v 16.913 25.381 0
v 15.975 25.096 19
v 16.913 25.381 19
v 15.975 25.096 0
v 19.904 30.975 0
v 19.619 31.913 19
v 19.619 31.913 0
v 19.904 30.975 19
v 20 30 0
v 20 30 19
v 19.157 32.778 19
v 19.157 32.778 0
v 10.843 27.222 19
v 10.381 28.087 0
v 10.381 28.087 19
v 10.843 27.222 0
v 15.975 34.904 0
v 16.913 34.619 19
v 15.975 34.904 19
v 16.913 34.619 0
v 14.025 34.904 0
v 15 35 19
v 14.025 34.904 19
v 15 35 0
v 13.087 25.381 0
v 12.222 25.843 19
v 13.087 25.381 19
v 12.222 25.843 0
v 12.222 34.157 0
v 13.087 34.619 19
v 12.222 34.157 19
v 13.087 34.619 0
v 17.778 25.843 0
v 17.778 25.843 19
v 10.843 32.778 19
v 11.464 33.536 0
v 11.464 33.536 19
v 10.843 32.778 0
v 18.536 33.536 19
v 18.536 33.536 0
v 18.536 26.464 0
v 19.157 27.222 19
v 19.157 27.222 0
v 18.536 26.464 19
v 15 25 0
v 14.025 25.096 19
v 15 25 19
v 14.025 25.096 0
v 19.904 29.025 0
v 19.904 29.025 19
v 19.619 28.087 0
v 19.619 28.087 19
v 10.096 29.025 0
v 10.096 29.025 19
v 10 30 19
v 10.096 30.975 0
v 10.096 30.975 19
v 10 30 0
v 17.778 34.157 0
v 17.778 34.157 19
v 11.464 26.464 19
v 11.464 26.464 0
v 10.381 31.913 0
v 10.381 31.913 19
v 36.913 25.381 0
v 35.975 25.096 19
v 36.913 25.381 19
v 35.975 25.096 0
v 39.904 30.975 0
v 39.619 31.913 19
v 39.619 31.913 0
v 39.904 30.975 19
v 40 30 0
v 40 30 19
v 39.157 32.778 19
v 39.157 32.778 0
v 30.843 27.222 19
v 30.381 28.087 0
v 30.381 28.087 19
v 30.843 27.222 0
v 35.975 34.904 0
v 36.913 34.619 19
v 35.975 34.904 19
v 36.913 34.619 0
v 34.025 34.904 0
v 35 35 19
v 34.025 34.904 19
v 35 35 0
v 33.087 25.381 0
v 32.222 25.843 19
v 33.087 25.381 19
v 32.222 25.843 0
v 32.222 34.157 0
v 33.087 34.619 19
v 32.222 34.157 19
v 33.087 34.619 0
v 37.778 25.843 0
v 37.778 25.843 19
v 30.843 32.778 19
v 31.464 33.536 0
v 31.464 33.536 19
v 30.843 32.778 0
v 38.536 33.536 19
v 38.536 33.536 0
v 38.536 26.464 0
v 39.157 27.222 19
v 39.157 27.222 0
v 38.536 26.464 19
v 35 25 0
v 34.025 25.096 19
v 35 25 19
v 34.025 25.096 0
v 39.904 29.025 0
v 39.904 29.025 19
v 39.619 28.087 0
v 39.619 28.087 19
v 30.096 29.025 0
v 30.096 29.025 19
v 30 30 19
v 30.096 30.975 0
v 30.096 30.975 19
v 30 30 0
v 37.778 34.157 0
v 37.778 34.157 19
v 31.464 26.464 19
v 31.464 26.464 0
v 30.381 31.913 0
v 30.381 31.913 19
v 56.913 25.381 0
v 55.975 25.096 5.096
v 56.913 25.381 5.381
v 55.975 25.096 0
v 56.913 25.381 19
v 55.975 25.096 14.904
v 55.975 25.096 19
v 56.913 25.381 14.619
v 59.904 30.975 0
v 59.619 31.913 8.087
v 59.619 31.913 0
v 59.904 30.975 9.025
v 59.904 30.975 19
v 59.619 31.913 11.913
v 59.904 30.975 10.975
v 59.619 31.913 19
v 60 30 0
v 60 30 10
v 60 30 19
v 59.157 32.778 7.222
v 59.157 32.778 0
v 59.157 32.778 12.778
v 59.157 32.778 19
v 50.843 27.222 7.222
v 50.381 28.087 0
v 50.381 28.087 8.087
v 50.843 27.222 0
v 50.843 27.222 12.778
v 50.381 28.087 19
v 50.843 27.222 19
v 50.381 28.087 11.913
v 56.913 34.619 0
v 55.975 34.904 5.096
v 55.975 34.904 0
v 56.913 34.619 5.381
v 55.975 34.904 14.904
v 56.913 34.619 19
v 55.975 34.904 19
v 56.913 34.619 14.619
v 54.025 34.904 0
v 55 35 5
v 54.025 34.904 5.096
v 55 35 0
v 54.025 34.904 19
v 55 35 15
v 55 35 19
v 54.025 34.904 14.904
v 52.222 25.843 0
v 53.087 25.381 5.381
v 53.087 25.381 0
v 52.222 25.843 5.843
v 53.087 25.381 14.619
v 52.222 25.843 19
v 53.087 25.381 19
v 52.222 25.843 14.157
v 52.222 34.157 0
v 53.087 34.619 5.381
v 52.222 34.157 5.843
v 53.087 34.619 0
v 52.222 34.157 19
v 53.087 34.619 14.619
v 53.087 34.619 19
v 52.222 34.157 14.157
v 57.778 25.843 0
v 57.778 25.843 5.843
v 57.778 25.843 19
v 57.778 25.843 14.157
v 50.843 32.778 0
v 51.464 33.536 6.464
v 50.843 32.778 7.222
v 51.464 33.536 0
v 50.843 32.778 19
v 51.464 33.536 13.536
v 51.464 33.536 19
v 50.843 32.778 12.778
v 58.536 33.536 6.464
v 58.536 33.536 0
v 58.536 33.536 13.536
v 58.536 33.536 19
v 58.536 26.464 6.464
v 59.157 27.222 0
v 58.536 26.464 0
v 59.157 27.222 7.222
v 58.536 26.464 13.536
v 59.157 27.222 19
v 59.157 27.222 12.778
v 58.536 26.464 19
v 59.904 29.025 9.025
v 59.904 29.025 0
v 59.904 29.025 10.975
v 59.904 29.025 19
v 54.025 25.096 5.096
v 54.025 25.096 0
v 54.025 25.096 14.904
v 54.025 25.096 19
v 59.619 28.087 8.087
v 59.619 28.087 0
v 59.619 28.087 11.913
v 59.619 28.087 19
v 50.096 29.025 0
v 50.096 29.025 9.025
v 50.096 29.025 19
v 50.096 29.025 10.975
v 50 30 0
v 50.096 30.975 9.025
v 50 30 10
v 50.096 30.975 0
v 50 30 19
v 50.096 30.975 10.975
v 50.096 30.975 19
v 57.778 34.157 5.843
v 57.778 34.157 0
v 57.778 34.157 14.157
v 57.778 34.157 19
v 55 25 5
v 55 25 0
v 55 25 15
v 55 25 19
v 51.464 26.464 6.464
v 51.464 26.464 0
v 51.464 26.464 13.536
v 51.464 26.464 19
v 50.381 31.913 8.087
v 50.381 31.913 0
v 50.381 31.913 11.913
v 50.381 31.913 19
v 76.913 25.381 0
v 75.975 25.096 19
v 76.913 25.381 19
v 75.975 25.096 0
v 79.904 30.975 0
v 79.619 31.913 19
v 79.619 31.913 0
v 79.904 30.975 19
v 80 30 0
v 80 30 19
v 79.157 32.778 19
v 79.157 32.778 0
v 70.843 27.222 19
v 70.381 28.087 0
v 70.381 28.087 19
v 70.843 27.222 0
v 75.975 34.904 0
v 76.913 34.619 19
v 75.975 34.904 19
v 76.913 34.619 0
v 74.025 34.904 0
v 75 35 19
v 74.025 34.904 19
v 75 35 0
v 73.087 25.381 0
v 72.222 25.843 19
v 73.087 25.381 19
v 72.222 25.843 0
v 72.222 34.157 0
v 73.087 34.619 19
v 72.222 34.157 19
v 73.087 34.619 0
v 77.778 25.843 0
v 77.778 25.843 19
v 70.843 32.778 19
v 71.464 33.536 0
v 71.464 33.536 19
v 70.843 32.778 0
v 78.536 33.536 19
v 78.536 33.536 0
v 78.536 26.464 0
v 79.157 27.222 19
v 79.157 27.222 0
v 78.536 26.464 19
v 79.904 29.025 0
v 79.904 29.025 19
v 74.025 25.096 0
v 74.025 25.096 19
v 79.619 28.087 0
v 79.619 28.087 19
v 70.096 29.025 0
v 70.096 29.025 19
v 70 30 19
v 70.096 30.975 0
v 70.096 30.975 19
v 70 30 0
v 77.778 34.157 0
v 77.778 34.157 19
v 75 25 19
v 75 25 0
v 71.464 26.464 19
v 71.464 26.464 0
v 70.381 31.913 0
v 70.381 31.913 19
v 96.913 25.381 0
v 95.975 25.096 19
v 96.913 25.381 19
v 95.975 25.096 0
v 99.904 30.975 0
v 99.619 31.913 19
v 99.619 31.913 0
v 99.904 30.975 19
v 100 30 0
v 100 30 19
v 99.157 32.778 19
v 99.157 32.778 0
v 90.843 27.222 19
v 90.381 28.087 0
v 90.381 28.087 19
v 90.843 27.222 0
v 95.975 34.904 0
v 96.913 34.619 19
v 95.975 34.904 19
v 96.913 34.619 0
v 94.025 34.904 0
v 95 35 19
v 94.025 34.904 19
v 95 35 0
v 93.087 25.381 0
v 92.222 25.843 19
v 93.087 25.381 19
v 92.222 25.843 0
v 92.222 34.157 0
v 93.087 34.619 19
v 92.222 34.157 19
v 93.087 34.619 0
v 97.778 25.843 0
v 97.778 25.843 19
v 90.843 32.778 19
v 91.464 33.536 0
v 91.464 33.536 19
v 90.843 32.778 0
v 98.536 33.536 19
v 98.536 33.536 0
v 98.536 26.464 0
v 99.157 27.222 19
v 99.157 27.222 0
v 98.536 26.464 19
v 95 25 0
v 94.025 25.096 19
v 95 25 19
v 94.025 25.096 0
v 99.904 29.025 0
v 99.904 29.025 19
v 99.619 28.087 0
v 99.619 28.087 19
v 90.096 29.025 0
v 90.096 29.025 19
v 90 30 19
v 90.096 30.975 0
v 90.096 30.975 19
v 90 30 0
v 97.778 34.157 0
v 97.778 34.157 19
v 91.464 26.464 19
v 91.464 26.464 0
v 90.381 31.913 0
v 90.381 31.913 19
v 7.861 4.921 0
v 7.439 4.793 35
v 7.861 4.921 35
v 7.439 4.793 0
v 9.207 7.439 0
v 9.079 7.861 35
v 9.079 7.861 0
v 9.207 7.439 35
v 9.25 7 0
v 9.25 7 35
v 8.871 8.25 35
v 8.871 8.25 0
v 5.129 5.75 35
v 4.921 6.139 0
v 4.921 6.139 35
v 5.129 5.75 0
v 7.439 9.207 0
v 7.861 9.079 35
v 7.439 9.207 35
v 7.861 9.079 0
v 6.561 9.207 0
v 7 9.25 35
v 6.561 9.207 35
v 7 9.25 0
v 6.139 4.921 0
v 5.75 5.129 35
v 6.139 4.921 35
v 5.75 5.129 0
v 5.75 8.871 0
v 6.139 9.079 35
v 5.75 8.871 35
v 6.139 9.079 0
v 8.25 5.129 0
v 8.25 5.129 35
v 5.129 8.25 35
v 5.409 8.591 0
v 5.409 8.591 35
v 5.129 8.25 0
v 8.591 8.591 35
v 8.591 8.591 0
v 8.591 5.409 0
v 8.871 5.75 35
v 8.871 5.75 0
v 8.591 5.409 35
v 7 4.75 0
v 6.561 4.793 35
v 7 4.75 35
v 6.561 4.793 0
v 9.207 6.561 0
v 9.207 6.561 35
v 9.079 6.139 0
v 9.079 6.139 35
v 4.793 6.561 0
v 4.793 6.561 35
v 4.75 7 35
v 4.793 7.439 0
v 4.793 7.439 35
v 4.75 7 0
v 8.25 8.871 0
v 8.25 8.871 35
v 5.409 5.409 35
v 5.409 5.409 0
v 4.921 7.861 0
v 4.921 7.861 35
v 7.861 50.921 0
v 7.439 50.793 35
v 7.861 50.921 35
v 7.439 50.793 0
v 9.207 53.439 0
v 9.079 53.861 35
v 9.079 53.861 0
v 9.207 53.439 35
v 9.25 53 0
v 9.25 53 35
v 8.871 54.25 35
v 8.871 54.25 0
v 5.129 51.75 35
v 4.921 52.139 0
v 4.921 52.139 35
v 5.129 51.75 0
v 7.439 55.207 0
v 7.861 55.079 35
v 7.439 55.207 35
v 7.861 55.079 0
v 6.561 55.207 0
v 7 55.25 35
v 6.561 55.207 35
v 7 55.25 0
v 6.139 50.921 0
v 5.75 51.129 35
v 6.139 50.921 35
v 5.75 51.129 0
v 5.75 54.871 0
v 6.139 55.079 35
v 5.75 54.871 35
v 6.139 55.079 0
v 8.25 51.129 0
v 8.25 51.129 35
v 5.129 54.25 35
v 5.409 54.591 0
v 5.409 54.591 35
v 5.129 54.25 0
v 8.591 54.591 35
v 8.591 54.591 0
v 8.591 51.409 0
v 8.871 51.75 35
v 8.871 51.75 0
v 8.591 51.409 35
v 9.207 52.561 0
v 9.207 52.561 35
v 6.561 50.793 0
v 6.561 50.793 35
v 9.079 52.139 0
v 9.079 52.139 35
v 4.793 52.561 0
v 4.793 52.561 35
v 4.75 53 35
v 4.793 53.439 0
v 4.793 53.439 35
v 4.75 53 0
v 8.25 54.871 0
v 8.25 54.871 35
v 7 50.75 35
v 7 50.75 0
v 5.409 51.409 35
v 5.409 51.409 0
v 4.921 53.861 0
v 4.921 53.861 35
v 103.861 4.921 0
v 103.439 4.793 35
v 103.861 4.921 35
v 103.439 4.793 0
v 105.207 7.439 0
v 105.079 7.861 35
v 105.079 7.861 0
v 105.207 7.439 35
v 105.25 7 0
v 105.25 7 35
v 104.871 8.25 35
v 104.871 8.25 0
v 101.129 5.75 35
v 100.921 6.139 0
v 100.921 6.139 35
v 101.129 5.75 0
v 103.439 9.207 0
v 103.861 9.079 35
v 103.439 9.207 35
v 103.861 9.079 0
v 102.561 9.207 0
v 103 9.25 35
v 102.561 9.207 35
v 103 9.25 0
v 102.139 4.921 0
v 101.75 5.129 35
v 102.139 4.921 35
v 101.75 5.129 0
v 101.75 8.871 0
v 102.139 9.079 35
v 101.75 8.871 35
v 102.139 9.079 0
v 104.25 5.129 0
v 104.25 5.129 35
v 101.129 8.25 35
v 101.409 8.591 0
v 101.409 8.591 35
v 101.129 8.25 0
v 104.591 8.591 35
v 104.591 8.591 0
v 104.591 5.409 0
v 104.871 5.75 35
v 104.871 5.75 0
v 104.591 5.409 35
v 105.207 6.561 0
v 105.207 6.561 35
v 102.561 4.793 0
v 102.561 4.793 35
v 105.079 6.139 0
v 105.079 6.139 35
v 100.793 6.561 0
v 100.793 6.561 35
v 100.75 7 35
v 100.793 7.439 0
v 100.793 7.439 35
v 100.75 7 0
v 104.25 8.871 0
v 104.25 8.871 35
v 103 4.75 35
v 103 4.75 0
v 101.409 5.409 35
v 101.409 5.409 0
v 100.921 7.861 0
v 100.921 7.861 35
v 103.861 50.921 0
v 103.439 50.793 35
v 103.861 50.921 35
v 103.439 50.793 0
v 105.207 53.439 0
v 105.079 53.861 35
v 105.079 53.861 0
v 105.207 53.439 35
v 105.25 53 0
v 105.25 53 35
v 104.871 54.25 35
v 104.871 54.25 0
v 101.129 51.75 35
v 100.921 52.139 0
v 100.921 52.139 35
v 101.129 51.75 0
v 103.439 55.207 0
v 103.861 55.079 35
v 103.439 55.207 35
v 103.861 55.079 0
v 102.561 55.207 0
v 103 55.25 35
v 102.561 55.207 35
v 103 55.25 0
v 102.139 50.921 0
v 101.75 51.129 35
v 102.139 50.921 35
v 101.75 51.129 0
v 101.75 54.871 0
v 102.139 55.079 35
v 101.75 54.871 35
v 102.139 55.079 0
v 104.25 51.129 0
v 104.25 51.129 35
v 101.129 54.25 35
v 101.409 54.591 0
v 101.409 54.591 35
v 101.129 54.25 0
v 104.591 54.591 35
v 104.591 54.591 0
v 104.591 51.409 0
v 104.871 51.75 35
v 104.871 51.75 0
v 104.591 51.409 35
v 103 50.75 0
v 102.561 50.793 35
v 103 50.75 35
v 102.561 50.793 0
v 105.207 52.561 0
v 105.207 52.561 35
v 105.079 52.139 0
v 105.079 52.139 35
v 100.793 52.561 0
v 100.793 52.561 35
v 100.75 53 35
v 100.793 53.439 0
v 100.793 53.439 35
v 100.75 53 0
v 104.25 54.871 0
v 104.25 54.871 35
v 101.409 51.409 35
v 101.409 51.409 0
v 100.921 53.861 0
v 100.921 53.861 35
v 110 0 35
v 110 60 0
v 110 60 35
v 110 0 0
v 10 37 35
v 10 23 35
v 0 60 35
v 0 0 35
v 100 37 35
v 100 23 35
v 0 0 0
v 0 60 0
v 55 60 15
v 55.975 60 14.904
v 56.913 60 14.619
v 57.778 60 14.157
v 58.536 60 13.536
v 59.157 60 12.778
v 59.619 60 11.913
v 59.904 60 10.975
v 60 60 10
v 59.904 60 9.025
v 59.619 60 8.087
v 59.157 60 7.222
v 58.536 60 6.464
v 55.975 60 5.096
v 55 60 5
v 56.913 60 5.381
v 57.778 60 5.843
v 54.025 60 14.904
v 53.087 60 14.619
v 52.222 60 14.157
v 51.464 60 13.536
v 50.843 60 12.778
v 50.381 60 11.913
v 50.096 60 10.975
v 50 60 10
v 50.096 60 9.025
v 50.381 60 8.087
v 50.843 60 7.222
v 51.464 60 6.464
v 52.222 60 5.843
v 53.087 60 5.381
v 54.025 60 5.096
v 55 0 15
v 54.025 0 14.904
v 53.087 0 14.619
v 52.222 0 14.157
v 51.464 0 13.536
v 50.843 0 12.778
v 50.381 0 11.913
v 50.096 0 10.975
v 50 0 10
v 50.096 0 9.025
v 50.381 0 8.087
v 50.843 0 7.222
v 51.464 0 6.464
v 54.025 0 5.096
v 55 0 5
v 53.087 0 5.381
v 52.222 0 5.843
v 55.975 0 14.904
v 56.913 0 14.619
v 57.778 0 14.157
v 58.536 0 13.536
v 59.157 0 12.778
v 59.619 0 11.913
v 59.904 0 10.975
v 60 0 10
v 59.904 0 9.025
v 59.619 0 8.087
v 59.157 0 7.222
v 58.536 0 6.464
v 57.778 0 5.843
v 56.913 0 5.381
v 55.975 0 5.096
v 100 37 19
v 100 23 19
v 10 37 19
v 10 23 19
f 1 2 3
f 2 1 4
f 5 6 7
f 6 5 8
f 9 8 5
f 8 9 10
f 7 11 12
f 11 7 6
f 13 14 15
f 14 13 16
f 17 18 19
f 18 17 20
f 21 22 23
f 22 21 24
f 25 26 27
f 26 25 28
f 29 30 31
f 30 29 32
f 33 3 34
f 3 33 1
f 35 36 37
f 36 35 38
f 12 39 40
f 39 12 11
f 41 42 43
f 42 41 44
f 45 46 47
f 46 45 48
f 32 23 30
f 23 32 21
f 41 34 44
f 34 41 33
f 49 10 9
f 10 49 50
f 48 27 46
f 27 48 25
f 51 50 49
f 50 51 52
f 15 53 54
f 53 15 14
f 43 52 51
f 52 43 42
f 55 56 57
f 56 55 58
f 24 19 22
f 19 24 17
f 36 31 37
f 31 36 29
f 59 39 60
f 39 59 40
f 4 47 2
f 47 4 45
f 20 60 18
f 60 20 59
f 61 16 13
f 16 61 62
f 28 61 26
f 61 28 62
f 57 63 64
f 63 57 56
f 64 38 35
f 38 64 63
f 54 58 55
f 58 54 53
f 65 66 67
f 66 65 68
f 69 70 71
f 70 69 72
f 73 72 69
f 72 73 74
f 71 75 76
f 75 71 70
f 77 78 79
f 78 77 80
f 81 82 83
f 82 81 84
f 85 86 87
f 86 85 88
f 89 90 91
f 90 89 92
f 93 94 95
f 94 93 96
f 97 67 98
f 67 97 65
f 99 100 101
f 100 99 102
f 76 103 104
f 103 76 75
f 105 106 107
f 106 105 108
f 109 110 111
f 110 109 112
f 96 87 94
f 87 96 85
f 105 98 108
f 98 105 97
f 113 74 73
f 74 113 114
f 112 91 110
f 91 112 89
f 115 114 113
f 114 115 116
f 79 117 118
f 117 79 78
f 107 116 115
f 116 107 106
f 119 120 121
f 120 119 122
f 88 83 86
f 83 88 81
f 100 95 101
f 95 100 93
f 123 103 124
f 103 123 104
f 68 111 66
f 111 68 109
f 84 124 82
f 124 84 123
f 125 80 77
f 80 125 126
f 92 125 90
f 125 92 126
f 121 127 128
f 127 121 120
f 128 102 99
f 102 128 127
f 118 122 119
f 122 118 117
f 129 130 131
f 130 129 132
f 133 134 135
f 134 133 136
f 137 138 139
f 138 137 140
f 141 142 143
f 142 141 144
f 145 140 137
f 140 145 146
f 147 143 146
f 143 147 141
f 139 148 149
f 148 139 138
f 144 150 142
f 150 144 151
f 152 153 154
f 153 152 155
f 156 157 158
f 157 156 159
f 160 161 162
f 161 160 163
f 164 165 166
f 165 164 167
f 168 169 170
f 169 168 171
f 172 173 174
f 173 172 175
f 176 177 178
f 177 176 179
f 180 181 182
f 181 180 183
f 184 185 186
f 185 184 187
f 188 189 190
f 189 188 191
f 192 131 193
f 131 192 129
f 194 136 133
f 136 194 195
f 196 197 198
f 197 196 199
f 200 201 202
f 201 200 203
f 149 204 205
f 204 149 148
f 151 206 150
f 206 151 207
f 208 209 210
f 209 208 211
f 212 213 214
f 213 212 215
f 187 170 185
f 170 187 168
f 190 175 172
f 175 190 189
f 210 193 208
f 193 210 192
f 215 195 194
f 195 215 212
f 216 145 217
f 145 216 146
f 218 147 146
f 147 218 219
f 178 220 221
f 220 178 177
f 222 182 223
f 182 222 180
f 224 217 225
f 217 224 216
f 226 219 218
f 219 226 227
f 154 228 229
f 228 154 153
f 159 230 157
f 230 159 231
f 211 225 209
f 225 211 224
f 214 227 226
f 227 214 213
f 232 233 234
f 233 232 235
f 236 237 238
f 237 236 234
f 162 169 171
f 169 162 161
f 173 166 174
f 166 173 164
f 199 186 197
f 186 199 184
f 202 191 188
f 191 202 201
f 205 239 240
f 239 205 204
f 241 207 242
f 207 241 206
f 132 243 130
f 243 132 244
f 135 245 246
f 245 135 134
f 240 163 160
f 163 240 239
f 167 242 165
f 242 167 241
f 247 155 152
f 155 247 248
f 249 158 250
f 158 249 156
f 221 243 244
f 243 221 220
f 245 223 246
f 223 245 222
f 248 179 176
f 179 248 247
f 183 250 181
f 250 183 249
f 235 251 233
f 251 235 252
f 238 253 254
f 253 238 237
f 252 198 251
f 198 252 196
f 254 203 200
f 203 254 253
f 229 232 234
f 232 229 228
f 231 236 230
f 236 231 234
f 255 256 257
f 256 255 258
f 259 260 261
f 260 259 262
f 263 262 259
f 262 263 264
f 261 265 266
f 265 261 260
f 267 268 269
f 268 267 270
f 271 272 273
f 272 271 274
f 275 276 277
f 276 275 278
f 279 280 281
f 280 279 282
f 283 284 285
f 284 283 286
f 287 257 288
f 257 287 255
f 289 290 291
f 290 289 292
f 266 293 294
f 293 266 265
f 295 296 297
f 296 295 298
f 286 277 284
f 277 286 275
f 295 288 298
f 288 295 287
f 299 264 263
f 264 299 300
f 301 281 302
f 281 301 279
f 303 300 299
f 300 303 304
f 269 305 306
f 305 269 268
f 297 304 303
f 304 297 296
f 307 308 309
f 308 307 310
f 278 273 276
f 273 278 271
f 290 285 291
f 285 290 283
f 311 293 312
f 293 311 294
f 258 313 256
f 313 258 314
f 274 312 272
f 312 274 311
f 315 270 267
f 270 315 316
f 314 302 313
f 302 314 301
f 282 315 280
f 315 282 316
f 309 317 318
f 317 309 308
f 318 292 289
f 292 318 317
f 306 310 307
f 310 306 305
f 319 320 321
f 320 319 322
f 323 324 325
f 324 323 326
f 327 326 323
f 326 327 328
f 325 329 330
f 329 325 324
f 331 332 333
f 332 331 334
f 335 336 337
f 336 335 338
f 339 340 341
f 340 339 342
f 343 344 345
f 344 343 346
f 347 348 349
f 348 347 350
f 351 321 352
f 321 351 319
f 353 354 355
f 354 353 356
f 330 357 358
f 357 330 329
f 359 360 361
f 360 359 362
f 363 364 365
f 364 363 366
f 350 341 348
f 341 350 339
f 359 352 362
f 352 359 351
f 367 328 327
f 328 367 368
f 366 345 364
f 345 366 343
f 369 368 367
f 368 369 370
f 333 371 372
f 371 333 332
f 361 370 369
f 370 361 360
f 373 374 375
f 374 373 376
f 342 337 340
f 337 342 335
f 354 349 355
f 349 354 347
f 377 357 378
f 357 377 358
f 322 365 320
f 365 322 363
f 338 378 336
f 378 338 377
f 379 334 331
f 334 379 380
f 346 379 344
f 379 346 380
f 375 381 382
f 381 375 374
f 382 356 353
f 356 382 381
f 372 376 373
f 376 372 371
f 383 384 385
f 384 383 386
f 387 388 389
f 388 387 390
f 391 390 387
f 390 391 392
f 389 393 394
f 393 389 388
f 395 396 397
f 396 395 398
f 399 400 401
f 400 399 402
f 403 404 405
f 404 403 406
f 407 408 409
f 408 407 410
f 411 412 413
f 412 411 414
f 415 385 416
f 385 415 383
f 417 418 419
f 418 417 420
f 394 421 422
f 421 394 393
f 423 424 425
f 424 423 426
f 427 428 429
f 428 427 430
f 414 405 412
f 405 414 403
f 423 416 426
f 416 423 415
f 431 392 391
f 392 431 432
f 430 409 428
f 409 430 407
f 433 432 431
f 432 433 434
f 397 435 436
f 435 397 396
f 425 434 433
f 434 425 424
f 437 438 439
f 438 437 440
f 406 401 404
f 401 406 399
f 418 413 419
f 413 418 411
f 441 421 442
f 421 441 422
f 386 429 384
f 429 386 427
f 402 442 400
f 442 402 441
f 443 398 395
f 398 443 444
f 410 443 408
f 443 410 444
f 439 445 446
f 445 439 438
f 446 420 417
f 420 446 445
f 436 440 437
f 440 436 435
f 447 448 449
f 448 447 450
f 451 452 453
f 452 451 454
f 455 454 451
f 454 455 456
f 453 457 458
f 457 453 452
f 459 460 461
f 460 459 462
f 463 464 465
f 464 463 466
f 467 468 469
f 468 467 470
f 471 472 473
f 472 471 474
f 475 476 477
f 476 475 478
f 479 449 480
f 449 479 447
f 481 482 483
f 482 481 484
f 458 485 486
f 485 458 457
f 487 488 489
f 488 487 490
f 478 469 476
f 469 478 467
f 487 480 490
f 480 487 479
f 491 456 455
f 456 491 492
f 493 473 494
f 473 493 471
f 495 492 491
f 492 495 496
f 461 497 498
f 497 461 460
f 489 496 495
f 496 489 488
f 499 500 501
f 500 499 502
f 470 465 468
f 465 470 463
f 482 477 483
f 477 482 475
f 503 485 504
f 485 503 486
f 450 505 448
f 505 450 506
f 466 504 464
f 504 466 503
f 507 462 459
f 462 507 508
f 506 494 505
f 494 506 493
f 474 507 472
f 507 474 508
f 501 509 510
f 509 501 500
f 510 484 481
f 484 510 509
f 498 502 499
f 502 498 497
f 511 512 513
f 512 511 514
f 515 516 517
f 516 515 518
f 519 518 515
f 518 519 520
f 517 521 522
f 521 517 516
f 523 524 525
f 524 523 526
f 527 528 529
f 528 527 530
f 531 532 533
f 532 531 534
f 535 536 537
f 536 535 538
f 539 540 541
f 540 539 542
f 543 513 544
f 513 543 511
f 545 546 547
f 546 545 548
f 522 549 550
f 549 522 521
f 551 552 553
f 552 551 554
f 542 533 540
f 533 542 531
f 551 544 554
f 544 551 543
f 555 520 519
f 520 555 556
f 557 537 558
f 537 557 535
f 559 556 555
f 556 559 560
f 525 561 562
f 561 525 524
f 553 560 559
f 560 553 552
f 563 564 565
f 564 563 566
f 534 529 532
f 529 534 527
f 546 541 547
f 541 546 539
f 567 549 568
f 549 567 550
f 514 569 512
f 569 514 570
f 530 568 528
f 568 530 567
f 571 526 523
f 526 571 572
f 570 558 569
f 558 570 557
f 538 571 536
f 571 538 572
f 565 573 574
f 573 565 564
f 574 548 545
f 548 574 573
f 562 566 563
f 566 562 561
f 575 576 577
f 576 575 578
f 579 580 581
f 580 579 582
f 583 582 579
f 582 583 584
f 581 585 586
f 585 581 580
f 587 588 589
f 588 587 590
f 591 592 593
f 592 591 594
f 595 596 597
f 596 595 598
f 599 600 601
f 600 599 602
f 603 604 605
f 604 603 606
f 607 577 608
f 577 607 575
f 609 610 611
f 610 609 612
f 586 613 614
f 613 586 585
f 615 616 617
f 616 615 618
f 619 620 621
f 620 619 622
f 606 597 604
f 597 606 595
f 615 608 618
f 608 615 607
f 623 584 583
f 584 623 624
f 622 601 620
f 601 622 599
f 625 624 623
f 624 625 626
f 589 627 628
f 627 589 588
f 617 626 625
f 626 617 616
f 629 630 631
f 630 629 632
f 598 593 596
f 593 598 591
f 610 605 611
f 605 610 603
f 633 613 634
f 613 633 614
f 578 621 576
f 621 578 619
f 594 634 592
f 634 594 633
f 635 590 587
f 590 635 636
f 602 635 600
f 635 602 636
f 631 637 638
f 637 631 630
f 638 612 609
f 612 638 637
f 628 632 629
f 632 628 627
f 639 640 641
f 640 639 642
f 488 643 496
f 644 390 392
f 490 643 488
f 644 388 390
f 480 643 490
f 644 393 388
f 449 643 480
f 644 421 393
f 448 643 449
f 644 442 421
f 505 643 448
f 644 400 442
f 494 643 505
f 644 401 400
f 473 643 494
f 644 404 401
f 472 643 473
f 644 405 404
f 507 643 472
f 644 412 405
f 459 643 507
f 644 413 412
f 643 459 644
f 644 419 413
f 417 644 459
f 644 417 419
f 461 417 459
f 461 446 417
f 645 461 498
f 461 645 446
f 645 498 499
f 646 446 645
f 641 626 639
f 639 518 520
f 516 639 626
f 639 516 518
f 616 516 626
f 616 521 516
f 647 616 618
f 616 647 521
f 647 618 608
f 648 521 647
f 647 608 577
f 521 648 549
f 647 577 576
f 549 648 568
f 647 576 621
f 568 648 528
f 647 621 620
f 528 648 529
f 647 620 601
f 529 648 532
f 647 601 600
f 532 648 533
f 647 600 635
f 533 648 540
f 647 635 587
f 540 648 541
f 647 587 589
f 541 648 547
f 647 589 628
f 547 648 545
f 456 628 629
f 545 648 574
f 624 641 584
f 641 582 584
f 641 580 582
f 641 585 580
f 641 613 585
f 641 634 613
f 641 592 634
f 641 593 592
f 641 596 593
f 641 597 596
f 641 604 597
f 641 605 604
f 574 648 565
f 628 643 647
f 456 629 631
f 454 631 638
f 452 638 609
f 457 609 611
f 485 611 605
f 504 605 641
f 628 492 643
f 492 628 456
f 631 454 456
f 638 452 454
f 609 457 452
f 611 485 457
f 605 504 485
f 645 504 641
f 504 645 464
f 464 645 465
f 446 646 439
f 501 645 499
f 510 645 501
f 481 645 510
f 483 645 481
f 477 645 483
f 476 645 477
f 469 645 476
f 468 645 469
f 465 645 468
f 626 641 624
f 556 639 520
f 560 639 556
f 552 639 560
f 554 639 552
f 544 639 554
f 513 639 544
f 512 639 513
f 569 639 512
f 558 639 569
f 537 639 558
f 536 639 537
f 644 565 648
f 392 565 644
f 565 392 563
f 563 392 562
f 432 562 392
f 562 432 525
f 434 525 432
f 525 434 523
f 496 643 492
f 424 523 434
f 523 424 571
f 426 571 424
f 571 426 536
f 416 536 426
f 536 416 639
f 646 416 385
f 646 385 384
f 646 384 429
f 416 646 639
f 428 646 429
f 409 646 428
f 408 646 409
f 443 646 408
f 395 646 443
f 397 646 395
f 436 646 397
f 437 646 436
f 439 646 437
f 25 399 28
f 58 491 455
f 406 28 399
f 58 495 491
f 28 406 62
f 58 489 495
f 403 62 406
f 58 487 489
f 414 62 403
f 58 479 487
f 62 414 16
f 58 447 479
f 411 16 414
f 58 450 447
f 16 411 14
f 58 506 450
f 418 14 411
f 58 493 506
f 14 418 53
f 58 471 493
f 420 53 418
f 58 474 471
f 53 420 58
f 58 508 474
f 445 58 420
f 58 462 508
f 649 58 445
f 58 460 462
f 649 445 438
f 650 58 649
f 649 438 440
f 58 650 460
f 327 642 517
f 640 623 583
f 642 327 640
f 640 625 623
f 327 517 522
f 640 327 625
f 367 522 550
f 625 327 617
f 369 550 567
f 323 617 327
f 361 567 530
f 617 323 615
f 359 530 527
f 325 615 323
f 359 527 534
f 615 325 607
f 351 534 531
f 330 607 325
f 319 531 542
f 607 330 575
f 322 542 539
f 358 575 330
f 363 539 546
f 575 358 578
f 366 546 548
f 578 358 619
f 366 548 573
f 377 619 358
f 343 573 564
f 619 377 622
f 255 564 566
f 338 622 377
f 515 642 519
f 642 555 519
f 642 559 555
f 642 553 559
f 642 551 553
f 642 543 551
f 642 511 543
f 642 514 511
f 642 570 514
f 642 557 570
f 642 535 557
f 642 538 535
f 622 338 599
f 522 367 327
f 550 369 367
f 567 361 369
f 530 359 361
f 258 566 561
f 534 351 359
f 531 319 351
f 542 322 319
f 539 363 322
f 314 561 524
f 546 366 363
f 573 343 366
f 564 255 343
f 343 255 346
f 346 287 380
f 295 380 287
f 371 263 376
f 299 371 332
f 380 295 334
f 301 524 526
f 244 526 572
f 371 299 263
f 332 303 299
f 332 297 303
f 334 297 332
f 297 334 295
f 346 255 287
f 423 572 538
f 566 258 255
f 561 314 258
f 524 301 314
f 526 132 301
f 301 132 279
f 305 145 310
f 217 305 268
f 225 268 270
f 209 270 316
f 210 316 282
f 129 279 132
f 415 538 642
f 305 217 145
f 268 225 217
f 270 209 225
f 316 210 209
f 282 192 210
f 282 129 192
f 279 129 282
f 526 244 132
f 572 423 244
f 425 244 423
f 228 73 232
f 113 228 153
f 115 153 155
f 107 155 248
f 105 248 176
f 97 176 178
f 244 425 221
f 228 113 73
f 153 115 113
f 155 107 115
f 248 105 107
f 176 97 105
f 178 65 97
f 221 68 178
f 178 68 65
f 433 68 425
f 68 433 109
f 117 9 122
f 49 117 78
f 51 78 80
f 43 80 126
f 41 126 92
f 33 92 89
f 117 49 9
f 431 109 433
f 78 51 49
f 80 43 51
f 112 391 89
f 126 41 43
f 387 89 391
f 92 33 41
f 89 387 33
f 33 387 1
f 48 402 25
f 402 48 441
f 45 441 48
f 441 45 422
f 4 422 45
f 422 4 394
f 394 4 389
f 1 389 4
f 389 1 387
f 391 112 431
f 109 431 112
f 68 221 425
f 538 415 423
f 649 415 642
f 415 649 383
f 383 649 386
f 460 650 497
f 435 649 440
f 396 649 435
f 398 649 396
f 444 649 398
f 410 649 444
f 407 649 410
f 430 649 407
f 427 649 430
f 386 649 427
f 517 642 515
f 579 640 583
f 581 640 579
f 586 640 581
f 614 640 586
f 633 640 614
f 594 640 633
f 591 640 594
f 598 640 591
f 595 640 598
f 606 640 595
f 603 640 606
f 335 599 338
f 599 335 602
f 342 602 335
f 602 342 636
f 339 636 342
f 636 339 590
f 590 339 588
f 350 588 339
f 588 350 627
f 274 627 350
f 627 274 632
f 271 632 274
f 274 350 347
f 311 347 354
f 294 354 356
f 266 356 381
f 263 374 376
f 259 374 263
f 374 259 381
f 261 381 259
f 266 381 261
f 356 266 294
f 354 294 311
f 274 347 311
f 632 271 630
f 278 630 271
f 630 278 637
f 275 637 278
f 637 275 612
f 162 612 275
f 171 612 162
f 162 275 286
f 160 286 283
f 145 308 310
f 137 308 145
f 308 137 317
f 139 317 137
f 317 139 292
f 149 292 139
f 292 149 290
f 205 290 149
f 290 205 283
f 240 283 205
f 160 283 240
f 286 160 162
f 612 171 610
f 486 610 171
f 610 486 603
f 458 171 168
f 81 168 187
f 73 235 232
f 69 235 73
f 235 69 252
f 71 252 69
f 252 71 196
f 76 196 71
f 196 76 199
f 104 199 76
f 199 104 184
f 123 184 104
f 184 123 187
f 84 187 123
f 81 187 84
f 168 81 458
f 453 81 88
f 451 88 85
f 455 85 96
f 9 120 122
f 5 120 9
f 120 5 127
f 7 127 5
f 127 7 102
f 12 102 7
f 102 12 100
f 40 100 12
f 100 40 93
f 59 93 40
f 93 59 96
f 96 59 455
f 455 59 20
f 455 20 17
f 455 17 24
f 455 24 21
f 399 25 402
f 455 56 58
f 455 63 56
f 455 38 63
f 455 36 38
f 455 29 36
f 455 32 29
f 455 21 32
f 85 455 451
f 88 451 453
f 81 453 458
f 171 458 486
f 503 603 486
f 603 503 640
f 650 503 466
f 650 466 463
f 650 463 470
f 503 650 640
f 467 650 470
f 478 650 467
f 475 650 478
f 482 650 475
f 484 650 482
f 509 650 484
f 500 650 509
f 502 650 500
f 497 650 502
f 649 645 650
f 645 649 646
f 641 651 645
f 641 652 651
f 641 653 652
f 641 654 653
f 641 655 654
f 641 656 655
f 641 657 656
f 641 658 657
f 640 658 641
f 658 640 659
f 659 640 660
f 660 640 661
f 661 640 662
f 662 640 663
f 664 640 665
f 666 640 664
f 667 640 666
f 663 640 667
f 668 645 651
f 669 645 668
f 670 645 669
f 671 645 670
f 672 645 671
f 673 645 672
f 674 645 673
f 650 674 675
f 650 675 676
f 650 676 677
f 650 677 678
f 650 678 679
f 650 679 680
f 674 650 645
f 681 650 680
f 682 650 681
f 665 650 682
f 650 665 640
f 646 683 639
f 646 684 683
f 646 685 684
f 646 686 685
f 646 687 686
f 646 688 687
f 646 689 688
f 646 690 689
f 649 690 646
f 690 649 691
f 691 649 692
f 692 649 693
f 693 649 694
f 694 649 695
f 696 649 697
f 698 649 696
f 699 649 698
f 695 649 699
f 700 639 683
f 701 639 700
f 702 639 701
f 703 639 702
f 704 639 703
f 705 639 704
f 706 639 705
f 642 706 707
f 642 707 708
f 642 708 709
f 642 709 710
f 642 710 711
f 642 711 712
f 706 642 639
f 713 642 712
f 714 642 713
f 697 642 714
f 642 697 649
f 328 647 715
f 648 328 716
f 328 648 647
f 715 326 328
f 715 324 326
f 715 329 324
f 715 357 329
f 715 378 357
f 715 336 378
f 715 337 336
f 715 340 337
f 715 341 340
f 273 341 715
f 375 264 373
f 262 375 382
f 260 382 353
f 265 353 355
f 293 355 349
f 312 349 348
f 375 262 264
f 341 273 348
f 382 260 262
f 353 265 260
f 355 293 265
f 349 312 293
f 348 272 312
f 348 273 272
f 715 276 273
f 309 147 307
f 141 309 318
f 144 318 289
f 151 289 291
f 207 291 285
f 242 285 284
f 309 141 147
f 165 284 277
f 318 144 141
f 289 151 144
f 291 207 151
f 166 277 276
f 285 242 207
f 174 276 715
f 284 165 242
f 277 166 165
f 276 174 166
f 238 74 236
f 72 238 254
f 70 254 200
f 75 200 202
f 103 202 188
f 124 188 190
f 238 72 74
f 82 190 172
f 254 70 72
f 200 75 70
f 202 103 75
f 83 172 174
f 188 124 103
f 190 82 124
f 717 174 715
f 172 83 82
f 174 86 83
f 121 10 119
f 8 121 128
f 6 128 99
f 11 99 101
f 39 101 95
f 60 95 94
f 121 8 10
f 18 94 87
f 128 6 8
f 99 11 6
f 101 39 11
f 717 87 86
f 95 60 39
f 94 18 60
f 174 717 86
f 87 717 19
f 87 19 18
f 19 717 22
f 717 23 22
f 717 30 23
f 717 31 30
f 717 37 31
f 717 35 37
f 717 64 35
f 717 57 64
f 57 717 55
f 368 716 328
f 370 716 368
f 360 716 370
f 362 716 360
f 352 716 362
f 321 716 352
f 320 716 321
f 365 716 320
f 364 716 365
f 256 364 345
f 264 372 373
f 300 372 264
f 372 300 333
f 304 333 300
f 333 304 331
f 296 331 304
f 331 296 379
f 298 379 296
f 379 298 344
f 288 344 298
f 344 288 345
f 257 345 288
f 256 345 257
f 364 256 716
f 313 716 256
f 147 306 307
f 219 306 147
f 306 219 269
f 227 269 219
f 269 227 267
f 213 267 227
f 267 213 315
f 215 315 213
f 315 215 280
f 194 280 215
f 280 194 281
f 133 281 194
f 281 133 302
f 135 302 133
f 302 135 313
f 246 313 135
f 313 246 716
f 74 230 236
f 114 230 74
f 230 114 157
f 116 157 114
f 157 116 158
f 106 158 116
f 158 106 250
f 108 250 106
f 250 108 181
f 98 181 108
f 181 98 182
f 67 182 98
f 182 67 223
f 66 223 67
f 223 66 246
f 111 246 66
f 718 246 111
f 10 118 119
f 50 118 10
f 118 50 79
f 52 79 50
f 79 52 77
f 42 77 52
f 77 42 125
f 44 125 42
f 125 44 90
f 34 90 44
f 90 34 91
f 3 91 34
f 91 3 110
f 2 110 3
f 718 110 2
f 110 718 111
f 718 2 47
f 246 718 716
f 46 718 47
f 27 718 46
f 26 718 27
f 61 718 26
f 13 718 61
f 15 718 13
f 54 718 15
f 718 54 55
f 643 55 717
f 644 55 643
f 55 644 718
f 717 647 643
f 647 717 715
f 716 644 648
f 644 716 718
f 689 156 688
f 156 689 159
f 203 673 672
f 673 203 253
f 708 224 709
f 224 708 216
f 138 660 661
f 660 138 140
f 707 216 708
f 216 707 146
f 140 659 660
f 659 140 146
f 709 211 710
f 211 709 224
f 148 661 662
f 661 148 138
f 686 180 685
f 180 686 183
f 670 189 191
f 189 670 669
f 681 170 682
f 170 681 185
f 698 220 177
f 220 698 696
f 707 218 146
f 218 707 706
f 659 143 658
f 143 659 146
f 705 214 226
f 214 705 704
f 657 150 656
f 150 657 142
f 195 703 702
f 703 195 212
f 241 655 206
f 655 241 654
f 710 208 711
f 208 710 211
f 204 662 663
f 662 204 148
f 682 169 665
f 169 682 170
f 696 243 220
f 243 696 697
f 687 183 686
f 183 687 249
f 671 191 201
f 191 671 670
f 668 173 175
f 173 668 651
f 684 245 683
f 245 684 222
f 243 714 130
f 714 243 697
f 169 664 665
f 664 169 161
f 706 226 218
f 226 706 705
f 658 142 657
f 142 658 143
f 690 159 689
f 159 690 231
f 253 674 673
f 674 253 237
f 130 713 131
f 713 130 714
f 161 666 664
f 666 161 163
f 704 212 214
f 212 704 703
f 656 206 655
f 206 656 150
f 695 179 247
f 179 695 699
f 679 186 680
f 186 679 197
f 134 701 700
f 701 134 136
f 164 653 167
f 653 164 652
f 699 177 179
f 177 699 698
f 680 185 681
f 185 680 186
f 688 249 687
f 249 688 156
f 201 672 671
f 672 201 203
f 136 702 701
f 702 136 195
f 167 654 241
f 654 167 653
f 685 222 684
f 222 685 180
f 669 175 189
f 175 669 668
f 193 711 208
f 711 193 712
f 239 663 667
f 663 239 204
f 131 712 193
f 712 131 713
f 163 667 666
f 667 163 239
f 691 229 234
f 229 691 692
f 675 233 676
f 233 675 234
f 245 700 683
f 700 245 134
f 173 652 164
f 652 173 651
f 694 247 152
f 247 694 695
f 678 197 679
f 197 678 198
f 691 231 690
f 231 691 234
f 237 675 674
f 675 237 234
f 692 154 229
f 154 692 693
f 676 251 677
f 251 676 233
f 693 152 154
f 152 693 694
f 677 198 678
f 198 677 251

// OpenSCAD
$fn = 32;

// ----------------------------------------------------------------------
// Manifold block: side_outlet manifold
// ----------------------------------------------------------------------

// --- parameters (mm) ---
block_l = 110;            // block length, X
block_w = 60;             // block width, Y
block_h = 35;             // block height, Z
port_d = 10;              // port bore diameter
port_pitch = 20;          // port pitch along X
gallery_d = 14;           // top gallery width, Y
gallery_depth = 16;       // gallery pocket depth
wall_p = 10;              // gallery end wall thickness, X
mnt_d = 4.5;              // mounting hole diameter
mnt_in = 7;               // mounting hole inset from the edges
out_d = 10;               // outlet bore diameter
out_z = 10;               // outlet axis height

n_ports = 5;  // ports in the row
port_x0 = (block_l - (n_ports - 1) * port_pitch) / 2;  // first port X

difference() {
  cube([block_l, block_w, block_h]);
  for (i = [0 : n_ports - 1])
    translate([port_x0 + i * port_pitch, block_w / 2, -1])
      cylinder(h = block_h + 2, d = port_d);
  translate([wall_p, block_w / 2 - gallery_d / 2, block_h - gallery_depth])
    cube([block_l - 2 * wall_p, gallery_d, gallery_depth + 1]);
  for (cx = [mnt_in, block_l - mnt_in])
    for (cy = [mnt_in, block_w - mnt_in])
      translate([cx, cy, -1]) cylinder(h = block_h + 2, d = mnt_d);
  translate([block_l / 2, -1, out_z]) rotate([-90, 0, 0])
    cylinder(h = block_w + 2, d = out_d);
}
